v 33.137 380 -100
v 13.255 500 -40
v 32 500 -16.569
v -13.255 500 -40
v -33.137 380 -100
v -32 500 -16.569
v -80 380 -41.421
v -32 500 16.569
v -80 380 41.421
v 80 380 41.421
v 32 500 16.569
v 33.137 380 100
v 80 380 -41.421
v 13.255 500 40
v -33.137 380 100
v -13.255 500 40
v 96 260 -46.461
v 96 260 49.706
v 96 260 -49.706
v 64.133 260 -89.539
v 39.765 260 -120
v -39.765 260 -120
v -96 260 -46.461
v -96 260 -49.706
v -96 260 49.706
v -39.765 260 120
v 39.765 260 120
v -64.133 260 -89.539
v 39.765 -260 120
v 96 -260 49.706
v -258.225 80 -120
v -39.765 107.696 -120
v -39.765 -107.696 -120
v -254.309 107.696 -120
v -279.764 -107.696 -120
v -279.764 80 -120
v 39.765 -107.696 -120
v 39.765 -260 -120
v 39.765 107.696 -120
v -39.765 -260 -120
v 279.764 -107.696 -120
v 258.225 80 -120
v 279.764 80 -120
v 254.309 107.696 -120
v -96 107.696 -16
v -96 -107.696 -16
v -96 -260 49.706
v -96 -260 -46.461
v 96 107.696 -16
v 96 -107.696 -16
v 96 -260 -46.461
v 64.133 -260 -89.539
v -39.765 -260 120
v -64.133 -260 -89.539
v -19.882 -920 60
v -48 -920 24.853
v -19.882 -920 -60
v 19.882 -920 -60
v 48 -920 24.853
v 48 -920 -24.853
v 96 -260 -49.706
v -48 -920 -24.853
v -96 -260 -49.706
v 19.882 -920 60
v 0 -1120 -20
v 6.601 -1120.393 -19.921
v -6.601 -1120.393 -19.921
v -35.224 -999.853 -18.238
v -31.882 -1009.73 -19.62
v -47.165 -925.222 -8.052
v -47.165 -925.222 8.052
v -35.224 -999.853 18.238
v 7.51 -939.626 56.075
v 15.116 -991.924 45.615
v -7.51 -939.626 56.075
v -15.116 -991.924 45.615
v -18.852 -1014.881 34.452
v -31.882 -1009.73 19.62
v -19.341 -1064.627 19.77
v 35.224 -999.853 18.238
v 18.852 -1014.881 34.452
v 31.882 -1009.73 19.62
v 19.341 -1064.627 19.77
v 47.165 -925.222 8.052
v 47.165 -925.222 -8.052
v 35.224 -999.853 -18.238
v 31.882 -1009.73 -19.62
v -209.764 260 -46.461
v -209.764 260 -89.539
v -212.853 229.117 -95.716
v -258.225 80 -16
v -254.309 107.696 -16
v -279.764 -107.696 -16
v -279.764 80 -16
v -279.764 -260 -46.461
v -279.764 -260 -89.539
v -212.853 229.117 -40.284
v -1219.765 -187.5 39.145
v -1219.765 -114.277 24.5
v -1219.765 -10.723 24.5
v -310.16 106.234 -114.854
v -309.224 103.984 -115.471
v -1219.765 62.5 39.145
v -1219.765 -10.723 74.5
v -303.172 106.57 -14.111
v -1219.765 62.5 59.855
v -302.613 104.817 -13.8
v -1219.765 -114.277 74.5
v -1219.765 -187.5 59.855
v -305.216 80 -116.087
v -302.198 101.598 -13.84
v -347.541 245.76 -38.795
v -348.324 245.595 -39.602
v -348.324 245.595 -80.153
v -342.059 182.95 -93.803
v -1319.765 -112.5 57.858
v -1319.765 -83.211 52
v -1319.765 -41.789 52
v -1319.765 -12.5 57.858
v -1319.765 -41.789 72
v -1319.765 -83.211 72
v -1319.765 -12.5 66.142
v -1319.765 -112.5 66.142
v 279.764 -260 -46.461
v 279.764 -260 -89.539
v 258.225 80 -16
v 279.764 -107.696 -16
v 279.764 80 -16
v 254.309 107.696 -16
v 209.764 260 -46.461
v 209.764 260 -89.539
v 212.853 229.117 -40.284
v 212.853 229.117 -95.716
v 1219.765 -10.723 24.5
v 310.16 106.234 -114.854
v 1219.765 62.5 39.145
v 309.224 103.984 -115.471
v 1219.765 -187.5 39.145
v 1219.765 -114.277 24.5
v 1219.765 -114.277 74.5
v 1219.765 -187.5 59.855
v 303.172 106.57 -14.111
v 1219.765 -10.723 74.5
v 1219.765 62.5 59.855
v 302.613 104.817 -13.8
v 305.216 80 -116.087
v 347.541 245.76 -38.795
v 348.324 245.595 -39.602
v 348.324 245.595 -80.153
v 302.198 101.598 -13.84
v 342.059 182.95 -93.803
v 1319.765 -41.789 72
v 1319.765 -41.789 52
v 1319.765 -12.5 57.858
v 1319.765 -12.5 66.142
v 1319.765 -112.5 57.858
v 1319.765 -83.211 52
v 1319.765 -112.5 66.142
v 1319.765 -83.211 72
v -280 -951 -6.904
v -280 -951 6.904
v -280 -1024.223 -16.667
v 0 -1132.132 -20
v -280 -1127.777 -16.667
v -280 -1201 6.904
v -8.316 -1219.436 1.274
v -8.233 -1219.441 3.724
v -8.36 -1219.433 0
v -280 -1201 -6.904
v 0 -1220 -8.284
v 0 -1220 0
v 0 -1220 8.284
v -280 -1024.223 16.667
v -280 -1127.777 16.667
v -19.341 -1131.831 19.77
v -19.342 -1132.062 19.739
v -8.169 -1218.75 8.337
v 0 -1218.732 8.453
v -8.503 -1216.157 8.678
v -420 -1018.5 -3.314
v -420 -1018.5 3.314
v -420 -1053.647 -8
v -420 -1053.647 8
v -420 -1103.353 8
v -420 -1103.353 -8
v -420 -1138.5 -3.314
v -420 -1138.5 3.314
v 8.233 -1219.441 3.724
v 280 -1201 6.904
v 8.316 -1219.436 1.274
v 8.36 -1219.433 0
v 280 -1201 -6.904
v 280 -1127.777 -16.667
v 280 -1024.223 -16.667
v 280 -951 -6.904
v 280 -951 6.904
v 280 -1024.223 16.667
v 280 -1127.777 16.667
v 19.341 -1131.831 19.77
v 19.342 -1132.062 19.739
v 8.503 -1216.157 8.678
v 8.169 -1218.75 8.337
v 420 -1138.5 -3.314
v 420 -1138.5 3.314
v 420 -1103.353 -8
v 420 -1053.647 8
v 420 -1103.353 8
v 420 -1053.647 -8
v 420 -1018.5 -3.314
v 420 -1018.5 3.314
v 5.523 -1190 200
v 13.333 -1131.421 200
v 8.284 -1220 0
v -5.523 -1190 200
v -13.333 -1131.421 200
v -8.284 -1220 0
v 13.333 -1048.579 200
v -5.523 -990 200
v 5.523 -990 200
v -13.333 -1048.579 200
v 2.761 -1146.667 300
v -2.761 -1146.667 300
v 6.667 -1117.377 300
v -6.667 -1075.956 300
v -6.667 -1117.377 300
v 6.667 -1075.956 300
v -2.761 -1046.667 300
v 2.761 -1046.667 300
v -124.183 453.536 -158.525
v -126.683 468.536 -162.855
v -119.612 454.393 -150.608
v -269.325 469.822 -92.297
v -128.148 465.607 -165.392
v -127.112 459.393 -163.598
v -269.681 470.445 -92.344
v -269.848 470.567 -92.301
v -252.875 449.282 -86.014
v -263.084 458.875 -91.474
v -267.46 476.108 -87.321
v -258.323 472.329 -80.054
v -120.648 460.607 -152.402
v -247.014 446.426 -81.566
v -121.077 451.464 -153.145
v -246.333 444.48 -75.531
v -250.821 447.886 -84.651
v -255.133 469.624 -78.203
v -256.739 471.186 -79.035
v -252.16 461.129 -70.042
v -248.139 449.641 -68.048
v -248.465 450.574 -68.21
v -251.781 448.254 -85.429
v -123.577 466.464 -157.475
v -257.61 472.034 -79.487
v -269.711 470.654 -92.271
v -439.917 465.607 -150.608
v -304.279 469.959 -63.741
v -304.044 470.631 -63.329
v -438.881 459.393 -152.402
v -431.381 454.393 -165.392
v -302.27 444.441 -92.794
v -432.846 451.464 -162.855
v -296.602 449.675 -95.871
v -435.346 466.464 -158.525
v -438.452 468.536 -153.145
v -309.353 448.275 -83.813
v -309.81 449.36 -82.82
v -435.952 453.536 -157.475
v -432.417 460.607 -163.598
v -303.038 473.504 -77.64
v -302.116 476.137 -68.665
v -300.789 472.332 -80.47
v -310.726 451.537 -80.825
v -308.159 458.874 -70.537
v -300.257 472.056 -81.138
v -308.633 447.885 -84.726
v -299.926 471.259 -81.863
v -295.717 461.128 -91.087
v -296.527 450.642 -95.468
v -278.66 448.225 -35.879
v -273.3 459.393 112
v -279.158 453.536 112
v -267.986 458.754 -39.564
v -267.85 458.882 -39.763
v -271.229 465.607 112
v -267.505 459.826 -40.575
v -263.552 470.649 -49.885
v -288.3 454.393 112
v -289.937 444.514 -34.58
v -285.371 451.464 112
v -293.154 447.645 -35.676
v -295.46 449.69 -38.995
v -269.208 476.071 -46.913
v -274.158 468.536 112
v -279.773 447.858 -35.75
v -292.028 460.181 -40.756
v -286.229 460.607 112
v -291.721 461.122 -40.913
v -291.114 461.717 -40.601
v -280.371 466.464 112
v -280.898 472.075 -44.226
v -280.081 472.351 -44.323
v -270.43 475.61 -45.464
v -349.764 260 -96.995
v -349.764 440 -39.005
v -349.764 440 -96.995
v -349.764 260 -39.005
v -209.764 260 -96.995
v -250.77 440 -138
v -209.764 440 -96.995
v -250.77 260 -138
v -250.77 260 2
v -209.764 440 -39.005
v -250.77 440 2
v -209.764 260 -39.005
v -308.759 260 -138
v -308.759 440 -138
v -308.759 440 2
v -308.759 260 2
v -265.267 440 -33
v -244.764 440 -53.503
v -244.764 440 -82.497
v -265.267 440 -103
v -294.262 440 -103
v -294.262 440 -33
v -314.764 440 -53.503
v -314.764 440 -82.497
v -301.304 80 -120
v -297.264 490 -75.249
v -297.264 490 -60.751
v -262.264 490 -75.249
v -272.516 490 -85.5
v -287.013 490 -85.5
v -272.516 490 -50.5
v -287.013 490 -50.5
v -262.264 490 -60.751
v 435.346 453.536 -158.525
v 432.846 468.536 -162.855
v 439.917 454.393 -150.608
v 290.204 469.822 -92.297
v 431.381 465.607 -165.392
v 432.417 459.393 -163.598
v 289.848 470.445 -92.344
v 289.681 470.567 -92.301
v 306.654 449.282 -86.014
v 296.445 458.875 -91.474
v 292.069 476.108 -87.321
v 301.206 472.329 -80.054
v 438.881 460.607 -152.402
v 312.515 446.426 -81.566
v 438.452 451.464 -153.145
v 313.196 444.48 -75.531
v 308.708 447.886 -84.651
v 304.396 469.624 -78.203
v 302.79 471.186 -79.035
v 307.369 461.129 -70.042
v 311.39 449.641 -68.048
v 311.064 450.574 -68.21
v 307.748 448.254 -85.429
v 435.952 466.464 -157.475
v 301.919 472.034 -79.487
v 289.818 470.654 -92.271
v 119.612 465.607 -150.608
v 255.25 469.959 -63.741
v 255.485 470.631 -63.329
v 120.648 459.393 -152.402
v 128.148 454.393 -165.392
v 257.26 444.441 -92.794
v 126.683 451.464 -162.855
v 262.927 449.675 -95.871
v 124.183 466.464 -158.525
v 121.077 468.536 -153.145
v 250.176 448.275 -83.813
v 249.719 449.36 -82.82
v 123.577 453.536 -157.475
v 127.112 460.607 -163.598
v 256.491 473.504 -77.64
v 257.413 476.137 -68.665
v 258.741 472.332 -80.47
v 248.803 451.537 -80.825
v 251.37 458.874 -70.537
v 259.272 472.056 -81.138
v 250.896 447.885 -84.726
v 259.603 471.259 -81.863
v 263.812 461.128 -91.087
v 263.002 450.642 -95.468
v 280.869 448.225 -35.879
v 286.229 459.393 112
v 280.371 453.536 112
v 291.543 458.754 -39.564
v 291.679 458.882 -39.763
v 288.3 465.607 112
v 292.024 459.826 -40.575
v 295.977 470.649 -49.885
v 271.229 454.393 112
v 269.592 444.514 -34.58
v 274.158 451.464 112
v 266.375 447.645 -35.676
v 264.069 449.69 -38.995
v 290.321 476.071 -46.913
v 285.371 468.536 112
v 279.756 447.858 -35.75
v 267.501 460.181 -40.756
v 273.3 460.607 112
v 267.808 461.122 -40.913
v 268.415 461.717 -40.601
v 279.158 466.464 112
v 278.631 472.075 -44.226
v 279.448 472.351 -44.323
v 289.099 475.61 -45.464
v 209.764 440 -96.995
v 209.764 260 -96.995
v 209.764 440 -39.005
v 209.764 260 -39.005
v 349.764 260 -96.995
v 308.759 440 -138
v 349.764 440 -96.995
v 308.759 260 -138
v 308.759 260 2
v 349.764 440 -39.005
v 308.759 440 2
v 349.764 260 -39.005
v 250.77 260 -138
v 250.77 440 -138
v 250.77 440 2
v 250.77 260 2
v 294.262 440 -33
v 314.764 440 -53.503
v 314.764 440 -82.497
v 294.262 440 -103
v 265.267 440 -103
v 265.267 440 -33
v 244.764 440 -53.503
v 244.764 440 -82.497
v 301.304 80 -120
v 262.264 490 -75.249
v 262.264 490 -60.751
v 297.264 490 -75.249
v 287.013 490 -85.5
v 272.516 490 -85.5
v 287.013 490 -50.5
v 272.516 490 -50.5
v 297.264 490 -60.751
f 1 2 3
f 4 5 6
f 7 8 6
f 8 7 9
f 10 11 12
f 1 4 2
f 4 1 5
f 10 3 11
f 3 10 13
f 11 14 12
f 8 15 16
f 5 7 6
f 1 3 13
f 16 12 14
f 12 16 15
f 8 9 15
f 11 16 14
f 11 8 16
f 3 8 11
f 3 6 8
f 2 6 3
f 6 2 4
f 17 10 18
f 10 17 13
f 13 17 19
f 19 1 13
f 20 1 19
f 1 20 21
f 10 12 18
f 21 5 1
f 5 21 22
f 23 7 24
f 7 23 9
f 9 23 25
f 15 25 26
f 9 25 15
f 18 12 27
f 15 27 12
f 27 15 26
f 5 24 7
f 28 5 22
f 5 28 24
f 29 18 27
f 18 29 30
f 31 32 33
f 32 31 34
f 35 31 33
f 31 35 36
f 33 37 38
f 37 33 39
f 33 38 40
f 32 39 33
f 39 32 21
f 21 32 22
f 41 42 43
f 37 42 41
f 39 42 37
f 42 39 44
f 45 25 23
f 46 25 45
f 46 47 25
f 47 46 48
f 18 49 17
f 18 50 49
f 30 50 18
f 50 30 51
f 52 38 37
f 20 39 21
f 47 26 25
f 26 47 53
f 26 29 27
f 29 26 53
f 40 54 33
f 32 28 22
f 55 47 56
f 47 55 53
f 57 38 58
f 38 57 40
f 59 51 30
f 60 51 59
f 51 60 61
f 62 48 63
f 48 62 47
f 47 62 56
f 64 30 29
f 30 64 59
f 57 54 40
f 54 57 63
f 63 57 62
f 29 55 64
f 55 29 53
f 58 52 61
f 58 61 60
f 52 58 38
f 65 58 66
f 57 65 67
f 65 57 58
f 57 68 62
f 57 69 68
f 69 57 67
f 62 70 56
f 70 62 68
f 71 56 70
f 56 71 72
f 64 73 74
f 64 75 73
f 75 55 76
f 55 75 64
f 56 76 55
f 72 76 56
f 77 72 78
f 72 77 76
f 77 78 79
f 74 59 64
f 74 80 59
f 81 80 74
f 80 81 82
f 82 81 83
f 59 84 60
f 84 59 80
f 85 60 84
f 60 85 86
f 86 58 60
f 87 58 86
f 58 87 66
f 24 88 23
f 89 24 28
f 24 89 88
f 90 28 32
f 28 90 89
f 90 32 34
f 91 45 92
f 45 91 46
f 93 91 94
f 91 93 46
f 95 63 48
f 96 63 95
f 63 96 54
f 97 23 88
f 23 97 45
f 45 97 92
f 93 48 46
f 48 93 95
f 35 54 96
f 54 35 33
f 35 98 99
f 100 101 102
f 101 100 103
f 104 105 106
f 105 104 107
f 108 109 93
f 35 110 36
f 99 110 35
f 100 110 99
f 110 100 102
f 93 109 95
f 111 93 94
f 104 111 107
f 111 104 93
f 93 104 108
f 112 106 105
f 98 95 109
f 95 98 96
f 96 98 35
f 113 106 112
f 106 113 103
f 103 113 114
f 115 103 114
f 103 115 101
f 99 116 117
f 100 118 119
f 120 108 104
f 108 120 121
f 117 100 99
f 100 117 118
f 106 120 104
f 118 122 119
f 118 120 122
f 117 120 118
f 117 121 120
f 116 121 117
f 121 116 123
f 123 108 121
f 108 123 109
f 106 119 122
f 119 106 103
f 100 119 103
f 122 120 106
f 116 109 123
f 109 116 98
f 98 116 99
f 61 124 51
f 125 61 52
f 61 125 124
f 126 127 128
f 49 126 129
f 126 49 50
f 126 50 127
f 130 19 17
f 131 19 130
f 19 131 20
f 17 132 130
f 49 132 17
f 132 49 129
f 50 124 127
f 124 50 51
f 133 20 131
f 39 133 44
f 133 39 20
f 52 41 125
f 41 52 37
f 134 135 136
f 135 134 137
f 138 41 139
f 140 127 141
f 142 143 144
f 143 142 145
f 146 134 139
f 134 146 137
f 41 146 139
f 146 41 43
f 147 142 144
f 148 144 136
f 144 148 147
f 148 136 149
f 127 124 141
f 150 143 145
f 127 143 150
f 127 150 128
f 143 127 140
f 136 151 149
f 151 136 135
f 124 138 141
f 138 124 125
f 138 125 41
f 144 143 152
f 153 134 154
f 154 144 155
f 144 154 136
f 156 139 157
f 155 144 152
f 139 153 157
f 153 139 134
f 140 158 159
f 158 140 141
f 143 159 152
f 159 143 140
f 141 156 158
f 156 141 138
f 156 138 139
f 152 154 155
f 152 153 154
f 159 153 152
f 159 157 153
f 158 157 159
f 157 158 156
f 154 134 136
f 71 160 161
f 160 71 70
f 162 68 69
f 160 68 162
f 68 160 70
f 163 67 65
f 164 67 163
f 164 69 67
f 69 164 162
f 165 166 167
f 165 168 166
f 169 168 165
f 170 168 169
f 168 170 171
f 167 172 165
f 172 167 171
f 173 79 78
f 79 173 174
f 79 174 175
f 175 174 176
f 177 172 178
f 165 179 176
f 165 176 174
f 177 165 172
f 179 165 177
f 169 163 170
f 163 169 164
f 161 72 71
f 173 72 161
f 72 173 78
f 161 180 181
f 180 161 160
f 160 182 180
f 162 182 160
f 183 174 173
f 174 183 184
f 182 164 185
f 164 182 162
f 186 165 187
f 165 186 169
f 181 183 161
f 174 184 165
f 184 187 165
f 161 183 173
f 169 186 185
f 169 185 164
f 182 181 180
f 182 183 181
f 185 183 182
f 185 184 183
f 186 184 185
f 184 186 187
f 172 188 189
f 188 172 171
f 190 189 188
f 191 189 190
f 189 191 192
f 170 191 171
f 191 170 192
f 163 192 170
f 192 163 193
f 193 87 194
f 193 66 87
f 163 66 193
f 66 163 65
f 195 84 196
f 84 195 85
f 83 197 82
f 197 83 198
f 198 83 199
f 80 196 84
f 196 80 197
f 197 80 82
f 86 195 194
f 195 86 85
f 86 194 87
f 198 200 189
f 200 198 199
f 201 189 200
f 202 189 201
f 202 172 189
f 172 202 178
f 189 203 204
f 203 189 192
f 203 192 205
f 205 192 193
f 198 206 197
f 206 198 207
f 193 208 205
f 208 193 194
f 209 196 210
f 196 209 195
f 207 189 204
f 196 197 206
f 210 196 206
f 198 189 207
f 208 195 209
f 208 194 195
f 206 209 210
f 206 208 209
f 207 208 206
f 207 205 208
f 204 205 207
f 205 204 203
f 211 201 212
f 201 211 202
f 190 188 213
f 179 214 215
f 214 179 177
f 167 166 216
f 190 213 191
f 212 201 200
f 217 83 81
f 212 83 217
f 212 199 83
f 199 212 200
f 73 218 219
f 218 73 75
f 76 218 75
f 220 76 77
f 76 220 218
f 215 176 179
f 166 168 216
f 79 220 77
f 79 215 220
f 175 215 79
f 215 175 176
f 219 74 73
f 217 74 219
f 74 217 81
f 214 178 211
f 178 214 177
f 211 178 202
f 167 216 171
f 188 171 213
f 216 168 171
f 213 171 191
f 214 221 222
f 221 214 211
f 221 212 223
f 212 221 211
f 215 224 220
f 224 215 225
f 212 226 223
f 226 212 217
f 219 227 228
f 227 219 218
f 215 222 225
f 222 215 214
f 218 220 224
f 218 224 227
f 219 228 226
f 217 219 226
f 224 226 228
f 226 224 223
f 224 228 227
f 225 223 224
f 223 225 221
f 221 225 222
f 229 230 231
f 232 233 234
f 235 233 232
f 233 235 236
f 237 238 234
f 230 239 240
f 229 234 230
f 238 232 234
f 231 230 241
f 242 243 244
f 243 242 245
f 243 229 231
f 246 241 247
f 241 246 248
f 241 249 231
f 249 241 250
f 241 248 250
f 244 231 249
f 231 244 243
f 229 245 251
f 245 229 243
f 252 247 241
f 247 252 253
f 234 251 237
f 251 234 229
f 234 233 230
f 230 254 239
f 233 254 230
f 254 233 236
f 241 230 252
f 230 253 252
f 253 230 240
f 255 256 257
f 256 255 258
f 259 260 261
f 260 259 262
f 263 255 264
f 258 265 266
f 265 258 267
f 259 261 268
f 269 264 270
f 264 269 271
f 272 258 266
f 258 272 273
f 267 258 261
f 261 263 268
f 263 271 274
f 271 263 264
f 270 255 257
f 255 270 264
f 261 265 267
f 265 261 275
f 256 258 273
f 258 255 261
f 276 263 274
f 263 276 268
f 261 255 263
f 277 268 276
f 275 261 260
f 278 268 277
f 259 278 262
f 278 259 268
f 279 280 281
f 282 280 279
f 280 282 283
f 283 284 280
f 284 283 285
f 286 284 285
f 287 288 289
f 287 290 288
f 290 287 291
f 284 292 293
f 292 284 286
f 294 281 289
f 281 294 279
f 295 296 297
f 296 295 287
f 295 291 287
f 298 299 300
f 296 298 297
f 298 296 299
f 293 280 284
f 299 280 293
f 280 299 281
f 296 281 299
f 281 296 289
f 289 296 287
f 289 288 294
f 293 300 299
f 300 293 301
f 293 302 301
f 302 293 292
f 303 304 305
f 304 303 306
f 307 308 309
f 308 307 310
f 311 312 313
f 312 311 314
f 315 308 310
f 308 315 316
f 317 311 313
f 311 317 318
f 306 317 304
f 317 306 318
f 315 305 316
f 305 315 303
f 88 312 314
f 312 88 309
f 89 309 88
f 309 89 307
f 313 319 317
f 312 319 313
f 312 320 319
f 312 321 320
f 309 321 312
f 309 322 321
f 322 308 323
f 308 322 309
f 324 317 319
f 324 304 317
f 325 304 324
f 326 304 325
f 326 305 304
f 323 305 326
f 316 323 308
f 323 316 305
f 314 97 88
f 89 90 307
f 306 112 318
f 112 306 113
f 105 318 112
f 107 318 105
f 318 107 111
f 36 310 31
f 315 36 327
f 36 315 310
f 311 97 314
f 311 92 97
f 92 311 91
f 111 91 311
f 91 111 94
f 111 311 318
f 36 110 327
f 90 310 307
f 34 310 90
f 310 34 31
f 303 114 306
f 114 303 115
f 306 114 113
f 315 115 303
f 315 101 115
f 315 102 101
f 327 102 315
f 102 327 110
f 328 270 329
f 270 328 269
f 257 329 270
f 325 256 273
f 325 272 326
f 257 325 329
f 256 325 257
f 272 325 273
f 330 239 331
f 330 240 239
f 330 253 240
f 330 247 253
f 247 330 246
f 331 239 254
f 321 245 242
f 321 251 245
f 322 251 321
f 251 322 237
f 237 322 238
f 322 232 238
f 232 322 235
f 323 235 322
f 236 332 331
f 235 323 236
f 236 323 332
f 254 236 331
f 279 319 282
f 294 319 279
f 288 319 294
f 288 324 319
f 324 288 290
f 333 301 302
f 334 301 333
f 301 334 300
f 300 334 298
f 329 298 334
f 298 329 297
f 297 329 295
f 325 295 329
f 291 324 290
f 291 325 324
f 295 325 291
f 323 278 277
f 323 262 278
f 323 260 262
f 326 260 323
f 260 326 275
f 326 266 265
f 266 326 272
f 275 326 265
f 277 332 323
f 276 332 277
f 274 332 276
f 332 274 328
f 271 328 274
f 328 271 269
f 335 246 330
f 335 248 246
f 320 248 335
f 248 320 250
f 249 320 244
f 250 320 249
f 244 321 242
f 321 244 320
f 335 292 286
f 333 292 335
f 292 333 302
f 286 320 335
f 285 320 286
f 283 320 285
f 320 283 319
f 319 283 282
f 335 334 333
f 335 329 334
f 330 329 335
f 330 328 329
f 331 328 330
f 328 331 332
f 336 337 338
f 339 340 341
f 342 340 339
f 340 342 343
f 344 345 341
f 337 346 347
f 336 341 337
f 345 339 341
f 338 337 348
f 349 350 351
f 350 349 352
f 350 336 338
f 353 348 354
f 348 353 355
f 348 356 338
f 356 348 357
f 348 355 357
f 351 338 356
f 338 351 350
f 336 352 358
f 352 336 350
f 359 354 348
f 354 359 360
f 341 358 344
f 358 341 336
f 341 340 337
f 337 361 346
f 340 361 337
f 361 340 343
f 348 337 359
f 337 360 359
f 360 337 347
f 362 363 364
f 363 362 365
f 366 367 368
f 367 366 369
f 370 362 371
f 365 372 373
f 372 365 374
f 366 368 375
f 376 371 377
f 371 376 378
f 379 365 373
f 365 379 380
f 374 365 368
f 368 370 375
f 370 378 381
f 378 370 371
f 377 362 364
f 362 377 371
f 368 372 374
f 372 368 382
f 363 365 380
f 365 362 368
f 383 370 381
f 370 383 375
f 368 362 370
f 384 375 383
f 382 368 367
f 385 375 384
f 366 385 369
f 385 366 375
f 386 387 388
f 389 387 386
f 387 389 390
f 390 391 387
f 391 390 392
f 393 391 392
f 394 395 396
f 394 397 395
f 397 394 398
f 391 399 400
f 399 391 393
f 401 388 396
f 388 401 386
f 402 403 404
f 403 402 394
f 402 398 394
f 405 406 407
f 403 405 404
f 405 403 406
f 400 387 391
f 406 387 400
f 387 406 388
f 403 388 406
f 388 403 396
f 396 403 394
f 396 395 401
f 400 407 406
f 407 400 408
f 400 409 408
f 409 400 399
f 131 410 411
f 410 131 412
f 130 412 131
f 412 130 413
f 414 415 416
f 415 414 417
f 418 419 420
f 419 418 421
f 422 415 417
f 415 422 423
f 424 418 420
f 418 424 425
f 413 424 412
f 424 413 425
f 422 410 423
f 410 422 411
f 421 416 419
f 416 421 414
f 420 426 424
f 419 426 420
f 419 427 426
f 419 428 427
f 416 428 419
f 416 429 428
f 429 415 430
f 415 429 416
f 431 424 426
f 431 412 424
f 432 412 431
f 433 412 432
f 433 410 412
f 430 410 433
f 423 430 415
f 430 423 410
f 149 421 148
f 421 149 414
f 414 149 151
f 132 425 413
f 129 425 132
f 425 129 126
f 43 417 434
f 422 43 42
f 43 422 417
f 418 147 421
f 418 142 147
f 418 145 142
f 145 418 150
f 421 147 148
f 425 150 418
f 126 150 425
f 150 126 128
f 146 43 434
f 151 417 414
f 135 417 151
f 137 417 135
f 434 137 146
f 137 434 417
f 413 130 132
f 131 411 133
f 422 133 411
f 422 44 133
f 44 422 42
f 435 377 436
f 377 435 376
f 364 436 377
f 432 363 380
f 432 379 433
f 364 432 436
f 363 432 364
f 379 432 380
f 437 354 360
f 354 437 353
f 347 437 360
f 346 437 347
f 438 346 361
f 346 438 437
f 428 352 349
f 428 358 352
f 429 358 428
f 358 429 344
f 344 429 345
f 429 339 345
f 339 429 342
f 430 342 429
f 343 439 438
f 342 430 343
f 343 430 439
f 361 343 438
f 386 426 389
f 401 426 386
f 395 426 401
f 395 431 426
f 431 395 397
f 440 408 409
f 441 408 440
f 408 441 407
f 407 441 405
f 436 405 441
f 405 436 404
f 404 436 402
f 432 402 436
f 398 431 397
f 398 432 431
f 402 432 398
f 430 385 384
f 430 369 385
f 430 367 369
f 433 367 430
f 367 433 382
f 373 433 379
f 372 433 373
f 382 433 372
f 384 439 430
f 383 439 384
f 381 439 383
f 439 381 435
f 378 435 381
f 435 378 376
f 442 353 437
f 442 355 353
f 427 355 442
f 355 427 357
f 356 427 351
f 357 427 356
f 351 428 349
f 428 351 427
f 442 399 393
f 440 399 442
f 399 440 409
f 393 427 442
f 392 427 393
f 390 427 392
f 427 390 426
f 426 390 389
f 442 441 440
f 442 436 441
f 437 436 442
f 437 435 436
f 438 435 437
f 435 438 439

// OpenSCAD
/*
Heinkel He 111 from behind;
scale: 1 unit = 9.2 mm (actual wingspan = 22.6 metres)
*/

use <common.scad>

/*
Sections of fuselage from front to rear:
    1, 2: nose cone
    3: from leading to trailing edge of wings
    4: frustum, from trailing edge of wings to leading edge of horiz. stabil.
    5: tail
*/
FUA  = 4/5;  // width/height ratio (must be uniform)
FUL1 = 120;
FUH1 =  80;
FUL2 = 120;
FUH2 = 200;
FUL3 = 520;
FUH3 = 240;
FBW3 = FUA*FUH3/(1+sqrt(2));  // flat bottom width
FUL4 = 660;
FUH4 = 120;
FUL5 = 300;
FUH5 =   0;

/*
wings
    "1" = inner, "2" = middle, "3" = outer
    "length" = from root to tip
    "width"  = from leading to trailing edge
*/
WIA  = 5;     // width/height ratio (must be uniform)
WIXO = 1/4;   // horizontal offset of middle wing (of WIW2)
WIYO = 1/8;   // vertical slope of middle & outer wings (of WIL2 & WIL3)
WIL1 = 240; WIW1 = FUL3;
WIL2 = 940; WIW2 = 250;
WIL3 = 100; WIW3 = 100;

/*
stabilisers
    "H" = horizontal, "V" = vertical
    "length" = from root to tip
    "width"  = from leading to trailing edge
*/
STAR  = 2/15;  // width/thickness ratio (must be uniform)
HSTL1 =  280;
HSTL2 =  140;
VSTL1 =  200;
VSTL2 =  100;
STW1  = FUL5;
HSTW2 =  250;
VSTW2 =  200;
HSTW3 =  120;
VSTW3 =  100;
HSTSL = 0.03;  // backwards slant (of STW1)
VSTSL = 0.10;  // backwards slant (of STW1)

// engines
ENR  =  70;  // radius
ENL  = 360;  // length
PRR  = 180;  // propeller radius
PHL  =  50;  // propeller hub length

THIN = 20;  // minimum thickness of anything

// colors
FUC = [.8, .5, .5];  // fuselage
PLC = [.8, .8, .5];  // wings and stabilisers
OTC = [.5, .8, .8];  // other parts

// fuselage
color(FUC) {
    // front
    translate([0, FUL2+(FUL1+FUL3)/2, 0]) {
        scale([FUA*FUH2, FUL1, FUH2]) right_oct_frustum(FUH1/FUH2);
    }
    // mid-front
    translate([0, (FUL2+FUL3)/2, 0]) {
        scale([FUA*FUH3, FUL2, FUH3]) right_oct_frustum(FUH2/FUH3);
    }
    // mid
    scale([FUA*FUH3, FUL3, FUH3]) oct_prism();
    // mid-rear
    translate([0, -(FUL3+FUL4)/2, 0]) {
        rotate(180) scale([FUA*FUH3, FUL4, FUH3]) right_oct_frustum(FUH4/FUH3);
    }
    // rear
    translate([0, -FUL4-(FUL3+FUL5)/2, 0]) {
        rotate(180) scale([FUA*FUH4, FUL5, FUH4]) right_oct_frustum(FUH5/FUH4);
    }
}

// wings
color(PLC) translate([0, 0, (WIW1/WIA-FUH3)/2]) for(x = [-1, 1]) {
    // inner (straight)
    translate([x*(FBW3+WIL1)/2, 0, 0]) {
        rotate(-x*90) scale([WIW1, WIL1, WIW1/WIA]) oct_prism();
    }
    // middle (horizontal & vertical slope)
    translate([x*((FBW3+WIL2)/2+WIL1), 0, 0]) {
        rotate(-x*90) scale([WIW1, WIL2, WIW1/WIA]) {
            oct_frustum(WIW2/WIW1, x*WIXO*WIW2/WIW1, WIYO*WIL2*WIA/WIW1);
        }
    }
    // outer (vertical slope)
    translate([x*((FBW3+WIL3)/2+WIL1+WIL2), -WIXO*WIW2, WIYO*WIL2]) {
        rotate(-x*90) scale([WIW2, WIL3, WIW2/WIA]) {
            oct_frustum(WIW3/WIW2, 0, WIYO*WIL3*WIA/WIW2);
        }
    }
}

// stabilisers
color(PLC) translate([0, -(FUL3+FUL5)/2-FUL4, 0]) {
    // horizontal
    for(x = [-1, 1]) translate([x*(HSTL1+HSTL2)/2, 0, 0]) rotate(-x*90) {
        stabiliser(HSTL1, HSTL2, STW1, HSTW2, HSTW3, x*HSTSL);
    }
    // vertical
    translate([0, 0, (VSTL1+VSTL2)/2]) rotate([90, 0, -90]) {
        stabiliser(VSTL1, VSTL2, STW1, VSTW2, VSTW3, VSTSL);
    }
}

// engines
color(OTC) for(x = [-1, 1]) {
    translate([x*(FBW3/2+WIL1), FUL3/2, (WIW1/WIA-FUH3)/2]) engine();
}

module stabiliser(il, ol, iw, mw, ow, sl) {
    /*
    il/ol    = inner/outer length
    iw/mw/ow = inner/middle/outer width
    sl       = slant backwards
    */
    translate([0, -ol/2, 0]) {
        scale([iw, il, STAR*iw]) oct_frustum(mw/iw, sl*il/(il+ol), 0);  // inner
    }
    translate([sl*il/(il+ol)*iw, il/2, 0]) {
        scale([mw, ol, STAR*mw]) oct_frustum(ow/mw, sl*ol/(il+ol), 0);  // outer
    }
}

module engine() {
    // front half
    translate([0, ENL/4, 0]) {
        scale([ENR*2, ENL/2, ENR*2]) oct_prism();
    }
    // rear half
    translate([0, -ENL/4, 0]) rotate(180) {
        scale([ENR*2, ENL/2, ENR*2]) right_oct_frustum(WIW1/(WIA*ENR*2));
    }
    // propeller hub
    translate([0, ENL/2+PHL/2, 0]) scale([ENR, PHL, ENR]) right_oct_frustum(1/2);
    // propeller blades
    for(i = [0, 1, 2]) rotate([0, 30+i*120, 0]) {
        translate([PRR/2, ENL/2+THIN, 0]) rotate([0, 45, -90]) {
            scale([THIN, PRR, THIN*2]) right_oct_frustum(1/2);
        }
    }
}
